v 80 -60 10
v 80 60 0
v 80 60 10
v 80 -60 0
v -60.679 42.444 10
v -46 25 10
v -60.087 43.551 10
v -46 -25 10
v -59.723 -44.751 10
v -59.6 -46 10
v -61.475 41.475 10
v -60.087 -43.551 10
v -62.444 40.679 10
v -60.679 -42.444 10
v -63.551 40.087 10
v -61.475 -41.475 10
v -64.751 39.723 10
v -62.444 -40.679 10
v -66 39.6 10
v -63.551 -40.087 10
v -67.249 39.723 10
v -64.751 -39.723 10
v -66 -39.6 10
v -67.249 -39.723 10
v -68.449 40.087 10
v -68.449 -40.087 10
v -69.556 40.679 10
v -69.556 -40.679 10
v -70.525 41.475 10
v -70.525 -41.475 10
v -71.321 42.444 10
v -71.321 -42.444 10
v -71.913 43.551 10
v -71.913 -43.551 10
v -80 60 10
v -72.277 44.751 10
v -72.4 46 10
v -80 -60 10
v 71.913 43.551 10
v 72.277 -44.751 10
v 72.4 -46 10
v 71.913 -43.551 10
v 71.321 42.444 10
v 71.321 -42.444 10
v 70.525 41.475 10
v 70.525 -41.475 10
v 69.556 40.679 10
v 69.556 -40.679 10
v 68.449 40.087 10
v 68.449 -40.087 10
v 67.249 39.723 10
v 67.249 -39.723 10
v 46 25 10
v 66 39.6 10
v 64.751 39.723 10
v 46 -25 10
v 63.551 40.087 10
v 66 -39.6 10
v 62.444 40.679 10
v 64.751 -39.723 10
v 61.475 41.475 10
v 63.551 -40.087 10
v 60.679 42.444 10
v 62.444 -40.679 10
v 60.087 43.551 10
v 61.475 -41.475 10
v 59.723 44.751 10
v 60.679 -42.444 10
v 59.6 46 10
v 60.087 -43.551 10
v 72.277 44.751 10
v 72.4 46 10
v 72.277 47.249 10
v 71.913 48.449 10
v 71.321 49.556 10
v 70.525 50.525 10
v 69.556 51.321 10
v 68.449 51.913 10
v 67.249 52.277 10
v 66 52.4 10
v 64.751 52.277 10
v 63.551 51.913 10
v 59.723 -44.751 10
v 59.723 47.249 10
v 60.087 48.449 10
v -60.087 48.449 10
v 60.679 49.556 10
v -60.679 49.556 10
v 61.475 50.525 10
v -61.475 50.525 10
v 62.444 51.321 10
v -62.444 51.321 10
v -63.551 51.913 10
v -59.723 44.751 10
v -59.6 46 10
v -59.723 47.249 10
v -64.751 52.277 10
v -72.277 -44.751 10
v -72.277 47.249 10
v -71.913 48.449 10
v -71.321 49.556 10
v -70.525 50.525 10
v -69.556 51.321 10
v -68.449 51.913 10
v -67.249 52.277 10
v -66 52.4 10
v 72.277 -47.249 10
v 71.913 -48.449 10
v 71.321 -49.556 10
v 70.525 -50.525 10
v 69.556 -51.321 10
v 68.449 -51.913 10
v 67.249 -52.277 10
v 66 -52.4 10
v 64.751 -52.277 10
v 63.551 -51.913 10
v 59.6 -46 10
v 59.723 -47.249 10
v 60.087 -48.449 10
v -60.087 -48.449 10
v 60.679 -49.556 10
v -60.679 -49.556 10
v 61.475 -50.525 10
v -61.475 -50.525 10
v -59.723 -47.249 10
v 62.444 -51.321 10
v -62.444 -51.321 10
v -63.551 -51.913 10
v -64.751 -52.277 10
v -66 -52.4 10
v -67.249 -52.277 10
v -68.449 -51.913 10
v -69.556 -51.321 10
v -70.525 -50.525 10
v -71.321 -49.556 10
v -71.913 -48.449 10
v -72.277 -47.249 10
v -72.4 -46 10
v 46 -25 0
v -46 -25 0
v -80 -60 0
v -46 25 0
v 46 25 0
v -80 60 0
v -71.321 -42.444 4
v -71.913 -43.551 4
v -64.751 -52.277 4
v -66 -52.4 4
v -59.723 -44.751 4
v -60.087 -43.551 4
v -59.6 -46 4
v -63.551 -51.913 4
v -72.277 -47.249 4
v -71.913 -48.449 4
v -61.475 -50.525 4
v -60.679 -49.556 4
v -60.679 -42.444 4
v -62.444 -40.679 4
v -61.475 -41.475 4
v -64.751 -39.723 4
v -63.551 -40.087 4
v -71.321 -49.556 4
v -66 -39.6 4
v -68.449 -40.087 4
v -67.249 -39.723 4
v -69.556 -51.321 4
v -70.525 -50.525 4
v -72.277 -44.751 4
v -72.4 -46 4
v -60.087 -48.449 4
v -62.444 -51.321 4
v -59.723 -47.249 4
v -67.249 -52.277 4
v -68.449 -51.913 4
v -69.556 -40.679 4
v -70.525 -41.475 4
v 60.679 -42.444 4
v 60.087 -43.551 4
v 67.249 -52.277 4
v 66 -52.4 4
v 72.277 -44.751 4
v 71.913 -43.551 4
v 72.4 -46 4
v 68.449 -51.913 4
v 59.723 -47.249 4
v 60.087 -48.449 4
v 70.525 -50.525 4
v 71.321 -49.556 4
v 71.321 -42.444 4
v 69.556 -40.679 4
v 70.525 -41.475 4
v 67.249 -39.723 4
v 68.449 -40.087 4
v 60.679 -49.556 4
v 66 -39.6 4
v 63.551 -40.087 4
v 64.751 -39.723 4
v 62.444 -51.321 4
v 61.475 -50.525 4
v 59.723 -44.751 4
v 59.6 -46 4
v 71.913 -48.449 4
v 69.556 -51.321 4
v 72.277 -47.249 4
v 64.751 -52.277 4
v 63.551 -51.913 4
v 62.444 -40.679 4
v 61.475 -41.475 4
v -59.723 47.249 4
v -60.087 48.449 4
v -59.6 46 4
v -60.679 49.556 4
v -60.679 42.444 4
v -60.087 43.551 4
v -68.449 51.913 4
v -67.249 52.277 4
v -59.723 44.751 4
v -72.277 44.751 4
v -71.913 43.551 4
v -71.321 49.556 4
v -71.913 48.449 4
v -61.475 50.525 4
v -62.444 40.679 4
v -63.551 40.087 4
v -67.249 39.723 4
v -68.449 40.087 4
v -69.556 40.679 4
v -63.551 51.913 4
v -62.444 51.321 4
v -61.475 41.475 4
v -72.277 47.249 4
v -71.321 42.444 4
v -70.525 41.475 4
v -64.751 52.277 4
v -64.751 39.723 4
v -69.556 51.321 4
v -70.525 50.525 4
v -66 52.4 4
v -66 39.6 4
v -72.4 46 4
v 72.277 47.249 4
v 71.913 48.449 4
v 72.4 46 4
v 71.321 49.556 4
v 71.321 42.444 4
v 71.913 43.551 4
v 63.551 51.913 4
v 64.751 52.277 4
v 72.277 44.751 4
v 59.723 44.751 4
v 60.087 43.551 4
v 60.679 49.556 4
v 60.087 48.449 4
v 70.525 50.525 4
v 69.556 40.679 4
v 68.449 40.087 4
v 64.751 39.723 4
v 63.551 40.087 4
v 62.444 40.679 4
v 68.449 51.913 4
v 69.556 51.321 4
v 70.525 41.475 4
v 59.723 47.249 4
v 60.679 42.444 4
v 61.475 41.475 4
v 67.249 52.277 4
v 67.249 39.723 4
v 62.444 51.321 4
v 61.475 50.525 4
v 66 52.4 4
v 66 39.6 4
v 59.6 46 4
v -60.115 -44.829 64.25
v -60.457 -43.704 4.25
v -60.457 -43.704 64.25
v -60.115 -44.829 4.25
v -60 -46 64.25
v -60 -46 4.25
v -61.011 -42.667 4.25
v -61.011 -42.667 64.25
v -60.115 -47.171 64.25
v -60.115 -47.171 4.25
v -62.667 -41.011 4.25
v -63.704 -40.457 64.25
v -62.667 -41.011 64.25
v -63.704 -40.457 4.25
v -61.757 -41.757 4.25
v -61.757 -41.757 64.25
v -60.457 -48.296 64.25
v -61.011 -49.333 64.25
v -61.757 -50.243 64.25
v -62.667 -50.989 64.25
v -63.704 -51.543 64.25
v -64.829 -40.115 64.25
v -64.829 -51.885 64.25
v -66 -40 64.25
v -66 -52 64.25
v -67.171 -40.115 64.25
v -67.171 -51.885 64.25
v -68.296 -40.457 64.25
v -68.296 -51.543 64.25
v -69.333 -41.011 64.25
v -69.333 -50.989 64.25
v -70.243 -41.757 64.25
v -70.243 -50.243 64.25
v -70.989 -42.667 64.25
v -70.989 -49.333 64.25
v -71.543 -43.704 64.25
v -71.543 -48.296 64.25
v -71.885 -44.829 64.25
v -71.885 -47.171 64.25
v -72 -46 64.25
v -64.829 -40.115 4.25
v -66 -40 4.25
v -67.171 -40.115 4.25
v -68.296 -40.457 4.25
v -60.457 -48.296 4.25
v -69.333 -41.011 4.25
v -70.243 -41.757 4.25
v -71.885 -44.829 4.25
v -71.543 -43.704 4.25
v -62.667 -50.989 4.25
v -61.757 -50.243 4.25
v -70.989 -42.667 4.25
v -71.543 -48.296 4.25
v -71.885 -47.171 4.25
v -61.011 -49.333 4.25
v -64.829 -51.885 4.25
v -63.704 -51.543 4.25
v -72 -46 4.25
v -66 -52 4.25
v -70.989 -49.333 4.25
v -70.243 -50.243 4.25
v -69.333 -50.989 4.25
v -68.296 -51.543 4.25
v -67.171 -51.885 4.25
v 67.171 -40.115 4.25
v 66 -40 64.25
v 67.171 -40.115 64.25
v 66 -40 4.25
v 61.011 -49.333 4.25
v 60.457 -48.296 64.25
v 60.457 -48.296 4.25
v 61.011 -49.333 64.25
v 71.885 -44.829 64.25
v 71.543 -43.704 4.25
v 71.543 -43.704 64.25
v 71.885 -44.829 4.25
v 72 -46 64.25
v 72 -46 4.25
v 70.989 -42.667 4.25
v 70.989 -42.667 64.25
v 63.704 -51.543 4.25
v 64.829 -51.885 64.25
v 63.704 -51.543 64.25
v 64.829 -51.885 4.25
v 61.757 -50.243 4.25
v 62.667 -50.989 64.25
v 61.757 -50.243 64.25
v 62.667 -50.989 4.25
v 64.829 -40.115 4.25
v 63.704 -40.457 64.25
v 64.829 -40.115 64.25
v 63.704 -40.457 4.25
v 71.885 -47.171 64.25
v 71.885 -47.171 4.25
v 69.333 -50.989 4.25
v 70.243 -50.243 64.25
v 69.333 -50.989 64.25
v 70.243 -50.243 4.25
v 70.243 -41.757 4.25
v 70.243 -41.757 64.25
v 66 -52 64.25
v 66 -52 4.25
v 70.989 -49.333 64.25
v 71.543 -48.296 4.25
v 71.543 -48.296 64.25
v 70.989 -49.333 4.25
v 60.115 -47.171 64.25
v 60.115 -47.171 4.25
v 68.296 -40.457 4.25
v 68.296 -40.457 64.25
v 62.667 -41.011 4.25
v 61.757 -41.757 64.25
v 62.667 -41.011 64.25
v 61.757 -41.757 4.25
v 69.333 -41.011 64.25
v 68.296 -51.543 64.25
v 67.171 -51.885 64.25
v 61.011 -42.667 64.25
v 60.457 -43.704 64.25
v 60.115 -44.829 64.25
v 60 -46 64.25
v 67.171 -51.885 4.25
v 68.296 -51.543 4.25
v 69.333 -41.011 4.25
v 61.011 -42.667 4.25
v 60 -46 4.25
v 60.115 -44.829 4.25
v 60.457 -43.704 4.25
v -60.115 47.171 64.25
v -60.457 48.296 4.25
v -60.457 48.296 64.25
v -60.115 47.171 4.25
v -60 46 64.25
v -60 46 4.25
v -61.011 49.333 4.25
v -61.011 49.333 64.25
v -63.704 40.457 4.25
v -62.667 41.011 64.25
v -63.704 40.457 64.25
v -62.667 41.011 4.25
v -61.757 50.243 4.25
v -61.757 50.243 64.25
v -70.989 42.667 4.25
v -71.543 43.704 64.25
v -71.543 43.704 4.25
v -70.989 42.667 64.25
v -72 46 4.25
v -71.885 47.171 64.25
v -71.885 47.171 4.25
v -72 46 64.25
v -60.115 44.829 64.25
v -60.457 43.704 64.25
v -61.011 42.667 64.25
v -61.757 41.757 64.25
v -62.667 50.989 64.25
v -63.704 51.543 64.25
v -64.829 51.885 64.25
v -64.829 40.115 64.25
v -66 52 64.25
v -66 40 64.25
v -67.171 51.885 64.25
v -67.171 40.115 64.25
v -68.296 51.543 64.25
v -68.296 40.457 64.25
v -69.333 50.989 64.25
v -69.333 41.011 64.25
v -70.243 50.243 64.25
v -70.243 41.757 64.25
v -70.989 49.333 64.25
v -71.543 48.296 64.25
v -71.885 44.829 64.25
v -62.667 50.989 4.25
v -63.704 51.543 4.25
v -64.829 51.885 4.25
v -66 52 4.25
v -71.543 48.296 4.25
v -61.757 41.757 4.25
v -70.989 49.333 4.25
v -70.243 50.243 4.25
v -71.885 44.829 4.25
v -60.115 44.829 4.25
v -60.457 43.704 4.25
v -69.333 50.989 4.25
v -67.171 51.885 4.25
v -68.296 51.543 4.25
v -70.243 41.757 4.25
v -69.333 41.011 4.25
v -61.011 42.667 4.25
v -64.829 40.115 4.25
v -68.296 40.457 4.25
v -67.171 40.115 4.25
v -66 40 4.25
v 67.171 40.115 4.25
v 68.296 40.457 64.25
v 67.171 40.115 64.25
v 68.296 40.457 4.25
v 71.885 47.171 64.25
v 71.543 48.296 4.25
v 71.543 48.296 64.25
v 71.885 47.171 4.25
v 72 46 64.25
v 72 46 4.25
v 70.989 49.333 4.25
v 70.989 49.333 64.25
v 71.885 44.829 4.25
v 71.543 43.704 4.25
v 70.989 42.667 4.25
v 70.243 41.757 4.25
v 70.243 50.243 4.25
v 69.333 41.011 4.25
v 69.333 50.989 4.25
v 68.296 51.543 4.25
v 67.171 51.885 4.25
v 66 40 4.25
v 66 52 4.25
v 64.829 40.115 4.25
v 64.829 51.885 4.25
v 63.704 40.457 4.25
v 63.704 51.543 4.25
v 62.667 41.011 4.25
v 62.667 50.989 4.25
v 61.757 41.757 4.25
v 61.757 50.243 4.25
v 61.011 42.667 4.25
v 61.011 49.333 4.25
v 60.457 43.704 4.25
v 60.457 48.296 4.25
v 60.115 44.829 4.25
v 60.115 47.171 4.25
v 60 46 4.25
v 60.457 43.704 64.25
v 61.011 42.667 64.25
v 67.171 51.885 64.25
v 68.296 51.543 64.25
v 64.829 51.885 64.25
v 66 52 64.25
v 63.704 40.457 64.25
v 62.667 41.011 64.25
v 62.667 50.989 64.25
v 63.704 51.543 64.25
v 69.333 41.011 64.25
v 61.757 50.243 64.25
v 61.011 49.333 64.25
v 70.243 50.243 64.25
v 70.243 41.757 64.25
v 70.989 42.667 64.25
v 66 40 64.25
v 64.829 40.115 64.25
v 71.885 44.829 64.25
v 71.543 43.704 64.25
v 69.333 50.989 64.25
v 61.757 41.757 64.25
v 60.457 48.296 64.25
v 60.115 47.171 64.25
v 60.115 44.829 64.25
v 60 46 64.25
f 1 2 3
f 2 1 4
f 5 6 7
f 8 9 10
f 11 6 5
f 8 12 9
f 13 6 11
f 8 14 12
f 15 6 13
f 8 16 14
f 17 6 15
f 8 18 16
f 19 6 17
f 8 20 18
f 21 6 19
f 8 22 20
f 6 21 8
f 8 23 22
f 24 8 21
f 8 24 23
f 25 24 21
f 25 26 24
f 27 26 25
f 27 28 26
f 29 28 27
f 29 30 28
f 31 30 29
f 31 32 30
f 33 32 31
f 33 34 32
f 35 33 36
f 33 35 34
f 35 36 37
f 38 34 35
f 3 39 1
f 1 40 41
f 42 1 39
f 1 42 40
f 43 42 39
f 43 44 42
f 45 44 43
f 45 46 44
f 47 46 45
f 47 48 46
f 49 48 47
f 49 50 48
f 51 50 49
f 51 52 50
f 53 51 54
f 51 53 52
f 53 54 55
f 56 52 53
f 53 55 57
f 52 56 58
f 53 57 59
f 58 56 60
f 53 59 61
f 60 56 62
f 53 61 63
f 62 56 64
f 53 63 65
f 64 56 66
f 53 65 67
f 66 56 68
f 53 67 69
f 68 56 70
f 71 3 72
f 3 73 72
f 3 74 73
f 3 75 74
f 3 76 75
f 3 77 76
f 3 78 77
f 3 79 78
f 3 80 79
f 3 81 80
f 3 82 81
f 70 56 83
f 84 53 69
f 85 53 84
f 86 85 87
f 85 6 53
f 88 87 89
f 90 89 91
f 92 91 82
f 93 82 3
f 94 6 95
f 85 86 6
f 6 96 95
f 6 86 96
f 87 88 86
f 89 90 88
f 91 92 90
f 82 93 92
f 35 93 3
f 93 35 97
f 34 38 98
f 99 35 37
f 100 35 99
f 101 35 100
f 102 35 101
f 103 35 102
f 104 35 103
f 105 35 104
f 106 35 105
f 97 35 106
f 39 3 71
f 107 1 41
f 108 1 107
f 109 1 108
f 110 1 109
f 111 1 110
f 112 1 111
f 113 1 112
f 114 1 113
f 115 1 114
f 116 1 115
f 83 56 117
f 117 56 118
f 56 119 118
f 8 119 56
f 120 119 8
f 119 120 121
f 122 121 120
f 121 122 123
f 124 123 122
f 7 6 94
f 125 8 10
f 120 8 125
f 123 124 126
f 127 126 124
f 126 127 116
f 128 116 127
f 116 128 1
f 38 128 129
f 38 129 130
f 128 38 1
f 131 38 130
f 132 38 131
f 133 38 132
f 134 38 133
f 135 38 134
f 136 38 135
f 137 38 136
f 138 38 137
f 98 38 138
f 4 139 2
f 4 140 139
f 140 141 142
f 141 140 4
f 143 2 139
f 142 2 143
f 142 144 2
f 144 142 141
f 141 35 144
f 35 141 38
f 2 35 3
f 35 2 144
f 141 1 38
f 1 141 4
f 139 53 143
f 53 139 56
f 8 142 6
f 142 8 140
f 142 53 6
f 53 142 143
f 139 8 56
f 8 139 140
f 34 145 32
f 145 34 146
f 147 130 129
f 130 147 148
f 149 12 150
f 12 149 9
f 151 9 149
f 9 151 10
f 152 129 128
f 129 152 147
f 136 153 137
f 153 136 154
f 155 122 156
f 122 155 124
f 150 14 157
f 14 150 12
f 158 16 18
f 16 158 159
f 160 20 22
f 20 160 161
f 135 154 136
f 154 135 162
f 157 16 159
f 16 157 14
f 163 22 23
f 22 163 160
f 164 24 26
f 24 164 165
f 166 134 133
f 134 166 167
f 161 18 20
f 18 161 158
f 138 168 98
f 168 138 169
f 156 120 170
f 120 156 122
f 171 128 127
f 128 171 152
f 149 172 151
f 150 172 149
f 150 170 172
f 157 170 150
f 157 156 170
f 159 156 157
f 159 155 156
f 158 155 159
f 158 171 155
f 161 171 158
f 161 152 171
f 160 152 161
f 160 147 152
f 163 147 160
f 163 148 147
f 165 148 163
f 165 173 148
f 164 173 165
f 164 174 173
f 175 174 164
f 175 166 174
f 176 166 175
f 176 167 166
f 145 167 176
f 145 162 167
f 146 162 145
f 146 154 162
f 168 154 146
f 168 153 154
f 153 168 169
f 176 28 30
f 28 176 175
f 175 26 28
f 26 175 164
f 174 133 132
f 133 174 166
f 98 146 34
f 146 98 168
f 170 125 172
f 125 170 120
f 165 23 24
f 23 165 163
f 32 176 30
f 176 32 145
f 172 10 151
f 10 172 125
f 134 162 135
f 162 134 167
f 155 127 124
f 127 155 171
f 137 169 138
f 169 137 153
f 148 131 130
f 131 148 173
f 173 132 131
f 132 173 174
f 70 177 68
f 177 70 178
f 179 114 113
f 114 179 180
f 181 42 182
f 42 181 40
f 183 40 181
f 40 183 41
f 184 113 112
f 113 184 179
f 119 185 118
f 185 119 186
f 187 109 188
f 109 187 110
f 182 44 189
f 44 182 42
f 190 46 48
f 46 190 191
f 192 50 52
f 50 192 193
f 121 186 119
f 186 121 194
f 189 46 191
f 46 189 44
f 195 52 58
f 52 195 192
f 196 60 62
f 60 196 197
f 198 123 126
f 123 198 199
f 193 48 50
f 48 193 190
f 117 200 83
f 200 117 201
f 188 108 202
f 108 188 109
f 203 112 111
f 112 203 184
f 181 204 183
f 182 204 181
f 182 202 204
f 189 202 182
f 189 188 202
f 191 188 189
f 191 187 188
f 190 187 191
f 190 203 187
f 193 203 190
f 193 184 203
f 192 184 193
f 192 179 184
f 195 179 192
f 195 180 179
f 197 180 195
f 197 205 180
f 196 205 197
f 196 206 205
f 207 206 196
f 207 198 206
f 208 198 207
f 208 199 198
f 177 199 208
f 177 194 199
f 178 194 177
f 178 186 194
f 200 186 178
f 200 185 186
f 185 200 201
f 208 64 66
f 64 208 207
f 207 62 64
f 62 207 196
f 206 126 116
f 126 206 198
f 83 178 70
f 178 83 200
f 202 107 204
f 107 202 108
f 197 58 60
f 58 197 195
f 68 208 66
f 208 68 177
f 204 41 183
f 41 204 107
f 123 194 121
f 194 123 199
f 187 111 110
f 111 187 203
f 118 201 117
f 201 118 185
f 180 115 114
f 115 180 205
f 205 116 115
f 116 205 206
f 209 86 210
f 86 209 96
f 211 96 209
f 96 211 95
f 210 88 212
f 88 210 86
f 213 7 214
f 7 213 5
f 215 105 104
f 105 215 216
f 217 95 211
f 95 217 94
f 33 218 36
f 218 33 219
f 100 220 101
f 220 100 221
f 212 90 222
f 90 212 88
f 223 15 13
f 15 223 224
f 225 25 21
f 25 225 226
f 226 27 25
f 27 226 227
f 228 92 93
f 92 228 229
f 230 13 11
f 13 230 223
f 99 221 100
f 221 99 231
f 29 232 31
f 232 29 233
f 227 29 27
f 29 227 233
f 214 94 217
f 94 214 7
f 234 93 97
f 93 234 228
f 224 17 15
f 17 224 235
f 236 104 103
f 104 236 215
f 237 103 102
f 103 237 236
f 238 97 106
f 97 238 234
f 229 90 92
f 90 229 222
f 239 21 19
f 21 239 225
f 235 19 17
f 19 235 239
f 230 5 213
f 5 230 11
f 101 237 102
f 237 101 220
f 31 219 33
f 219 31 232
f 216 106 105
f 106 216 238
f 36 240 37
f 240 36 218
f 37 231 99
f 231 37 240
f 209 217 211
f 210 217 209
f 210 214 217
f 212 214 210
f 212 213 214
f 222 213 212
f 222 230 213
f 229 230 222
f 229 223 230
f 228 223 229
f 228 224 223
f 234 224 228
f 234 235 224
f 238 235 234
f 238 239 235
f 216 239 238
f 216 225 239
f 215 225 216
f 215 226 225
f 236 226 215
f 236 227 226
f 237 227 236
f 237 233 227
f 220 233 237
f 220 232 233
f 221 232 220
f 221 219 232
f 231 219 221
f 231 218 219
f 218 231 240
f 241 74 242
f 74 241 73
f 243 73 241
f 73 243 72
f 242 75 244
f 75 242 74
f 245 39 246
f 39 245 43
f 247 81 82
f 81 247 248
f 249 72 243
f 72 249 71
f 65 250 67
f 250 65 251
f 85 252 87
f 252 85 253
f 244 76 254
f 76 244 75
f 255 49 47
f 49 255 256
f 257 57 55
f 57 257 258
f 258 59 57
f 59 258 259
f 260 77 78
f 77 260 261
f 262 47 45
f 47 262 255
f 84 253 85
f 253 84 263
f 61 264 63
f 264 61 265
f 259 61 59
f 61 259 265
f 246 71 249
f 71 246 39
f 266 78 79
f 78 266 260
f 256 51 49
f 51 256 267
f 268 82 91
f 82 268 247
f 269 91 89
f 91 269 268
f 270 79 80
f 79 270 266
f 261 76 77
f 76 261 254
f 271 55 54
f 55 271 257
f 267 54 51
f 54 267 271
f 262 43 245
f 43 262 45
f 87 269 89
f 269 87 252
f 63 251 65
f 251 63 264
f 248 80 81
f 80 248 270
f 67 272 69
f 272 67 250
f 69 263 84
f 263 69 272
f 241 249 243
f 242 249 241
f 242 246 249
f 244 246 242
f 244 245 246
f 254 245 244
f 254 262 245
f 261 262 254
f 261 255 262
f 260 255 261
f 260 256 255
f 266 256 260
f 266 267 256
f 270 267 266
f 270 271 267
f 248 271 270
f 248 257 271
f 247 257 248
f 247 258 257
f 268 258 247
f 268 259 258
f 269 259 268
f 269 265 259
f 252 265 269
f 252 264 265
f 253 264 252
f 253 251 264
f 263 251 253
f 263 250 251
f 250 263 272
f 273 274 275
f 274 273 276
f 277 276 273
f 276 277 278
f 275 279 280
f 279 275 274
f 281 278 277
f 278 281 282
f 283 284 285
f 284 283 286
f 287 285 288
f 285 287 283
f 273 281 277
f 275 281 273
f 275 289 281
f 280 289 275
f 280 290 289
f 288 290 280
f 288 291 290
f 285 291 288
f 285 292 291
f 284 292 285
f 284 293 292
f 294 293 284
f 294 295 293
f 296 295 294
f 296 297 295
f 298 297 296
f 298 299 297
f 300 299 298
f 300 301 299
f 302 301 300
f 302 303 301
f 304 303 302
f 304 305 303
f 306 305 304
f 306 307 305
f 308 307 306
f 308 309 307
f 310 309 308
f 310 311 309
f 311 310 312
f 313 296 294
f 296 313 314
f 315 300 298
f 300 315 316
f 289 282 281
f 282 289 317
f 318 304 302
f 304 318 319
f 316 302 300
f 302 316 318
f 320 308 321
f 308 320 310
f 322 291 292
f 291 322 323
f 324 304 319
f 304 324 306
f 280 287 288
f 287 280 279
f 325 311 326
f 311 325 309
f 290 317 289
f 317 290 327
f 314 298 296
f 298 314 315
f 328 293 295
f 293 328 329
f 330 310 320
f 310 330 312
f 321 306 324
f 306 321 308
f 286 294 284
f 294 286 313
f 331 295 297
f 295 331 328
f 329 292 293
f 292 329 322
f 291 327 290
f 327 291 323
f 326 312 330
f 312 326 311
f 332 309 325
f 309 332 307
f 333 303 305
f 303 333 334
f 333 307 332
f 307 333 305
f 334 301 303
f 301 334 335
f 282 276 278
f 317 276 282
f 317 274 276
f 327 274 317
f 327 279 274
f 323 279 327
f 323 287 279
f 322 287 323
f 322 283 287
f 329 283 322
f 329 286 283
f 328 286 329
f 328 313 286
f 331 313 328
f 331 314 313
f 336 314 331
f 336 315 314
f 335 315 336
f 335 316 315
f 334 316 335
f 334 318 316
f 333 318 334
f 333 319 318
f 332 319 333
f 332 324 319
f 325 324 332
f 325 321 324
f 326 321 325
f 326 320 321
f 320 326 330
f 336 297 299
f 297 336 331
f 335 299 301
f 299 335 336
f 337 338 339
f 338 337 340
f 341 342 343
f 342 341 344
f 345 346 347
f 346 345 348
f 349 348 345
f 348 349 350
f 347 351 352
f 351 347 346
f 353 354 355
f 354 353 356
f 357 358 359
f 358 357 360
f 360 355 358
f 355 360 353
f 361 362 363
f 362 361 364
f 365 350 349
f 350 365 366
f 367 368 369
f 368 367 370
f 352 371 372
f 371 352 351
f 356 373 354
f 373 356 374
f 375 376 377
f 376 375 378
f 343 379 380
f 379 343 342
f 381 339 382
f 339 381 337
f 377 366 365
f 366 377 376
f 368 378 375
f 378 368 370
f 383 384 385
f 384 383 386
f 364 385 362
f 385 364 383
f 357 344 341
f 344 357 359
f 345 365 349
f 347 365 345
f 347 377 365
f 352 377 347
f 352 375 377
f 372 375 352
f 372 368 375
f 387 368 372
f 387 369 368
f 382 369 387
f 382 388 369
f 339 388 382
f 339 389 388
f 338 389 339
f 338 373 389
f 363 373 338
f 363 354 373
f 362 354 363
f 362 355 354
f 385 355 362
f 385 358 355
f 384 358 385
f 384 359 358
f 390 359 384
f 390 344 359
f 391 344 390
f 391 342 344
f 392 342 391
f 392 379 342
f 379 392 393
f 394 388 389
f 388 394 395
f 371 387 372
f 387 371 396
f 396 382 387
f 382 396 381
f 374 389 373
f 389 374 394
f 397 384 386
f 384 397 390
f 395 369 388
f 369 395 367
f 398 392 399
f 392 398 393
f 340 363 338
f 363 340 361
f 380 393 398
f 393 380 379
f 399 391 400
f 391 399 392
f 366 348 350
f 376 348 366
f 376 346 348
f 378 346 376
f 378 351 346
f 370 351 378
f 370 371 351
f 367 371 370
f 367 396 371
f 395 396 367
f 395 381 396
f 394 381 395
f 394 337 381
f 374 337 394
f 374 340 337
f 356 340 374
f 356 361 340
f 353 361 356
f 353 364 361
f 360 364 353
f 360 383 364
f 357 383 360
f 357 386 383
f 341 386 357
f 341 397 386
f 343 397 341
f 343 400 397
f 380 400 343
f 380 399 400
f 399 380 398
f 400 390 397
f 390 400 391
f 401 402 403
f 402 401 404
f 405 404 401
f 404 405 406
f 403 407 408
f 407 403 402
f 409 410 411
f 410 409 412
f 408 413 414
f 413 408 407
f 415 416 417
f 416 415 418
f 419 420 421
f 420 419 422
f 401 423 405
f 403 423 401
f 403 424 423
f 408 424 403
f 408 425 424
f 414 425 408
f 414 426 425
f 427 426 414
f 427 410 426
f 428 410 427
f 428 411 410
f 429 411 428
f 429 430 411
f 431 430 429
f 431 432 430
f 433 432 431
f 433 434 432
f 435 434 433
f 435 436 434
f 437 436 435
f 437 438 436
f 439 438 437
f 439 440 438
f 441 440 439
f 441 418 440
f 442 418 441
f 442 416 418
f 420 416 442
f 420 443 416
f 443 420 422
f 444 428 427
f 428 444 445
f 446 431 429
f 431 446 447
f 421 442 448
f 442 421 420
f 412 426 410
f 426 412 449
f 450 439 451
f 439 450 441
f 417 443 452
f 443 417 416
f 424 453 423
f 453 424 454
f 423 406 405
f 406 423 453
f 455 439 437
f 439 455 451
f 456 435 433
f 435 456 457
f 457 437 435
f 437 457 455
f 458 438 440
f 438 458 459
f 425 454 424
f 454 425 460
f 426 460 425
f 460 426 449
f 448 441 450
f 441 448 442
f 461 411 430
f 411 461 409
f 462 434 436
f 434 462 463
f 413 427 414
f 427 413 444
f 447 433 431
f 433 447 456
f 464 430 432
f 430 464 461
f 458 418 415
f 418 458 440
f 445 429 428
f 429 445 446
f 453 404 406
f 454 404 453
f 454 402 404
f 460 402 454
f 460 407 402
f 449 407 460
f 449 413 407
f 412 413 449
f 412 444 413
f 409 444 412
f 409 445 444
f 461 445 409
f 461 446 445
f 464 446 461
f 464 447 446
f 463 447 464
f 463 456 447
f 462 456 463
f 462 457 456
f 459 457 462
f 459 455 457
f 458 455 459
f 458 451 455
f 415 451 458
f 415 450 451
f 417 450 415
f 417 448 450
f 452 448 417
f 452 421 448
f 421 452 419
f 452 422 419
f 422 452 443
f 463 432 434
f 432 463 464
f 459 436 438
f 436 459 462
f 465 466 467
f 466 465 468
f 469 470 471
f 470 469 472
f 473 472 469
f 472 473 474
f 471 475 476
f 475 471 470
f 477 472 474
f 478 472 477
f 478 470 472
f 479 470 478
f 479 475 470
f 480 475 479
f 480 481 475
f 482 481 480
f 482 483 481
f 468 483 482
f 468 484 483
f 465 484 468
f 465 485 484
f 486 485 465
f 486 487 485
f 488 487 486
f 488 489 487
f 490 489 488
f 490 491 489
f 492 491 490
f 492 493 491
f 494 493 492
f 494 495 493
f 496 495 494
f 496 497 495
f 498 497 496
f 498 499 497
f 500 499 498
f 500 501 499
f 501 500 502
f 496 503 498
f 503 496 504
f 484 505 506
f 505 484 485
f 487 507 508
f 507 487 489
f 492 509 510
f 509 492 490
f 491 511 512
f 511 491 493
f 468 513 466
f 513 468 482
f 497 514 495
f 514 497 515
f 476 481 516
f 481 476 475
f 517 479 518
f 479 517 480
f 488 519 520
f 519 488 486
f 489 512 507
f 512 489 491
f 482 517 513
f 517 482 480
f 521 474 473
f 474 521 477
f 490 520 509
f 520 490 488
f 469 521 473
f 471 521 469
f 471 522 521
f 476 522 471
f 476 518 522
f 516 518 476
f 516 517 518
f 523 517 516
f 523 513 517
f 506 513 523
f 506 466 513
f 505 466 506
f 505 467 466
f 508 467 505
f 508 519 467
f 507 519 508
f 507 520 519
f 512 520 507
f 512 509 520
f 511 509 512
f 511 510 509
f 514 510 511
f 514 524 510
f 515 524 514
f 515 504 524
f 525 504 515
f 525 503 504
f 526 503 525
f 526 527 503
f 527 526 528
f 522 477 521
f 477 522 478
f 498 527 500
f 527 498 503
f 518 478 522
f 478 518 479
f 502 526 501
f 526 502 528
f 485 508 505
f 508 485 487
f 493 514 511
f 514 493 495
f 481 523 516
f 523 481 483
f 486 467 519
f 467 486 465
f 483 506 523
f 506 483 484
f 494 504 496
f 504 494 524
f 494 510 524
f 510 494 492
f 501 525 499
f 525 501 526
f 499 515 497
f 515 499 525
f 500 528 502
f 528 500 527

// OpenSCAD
$fn = 32;

// ------------------------------------------------------------------------
// Frame with four posts: 160 x 120 mm frame, four d12 posts
// Every part is its own module, assembly() places them once.
// ------------------------------------------------------------------------

// --- part 1 ---
module base_frame() {
  difference() {
    translate([-80, -60, 0]) cube([160, 120, 10]);
    translate([-46, -25, -1]) cube([92, 50, 12]);
    translate([-66, -46, 4]) cylinder(h = 7, d = 12.8);
    translate([66, -46, 4]) cylinder(h = 7, d = 12.8);
    translate([-66, 46, 4]) cylinder(h = 7, d = 12.8);
    translate([66, 46, 4]) cylinder(h = 7, d = 12.8);
  }
}

// --- part 2 ---
module post1() {
  cylinder(h = 60, d = 12);
}

// --- part 3 ---
module post2() {
  cylinder(h = 60, d = 12);
}

// --- part 4 ---
module post3() {
  cylinder(h = 60, d = 12);
}

// --- part 5 ---
module post4() {
  cylinder(h = 60, d = 12);
}

// --- assembly ---
module assembly() {
  translate([0, 0, 0]) rotate([0, 0, 0]) base_frame();
  translate([-66, -46, 4.25]) rotate([0, 0, 0]) post1();
  translate([66, -46, 4.25]) rotate([0, 0, 0]) post2();
  translate([-66, 46, 4.25]) rotate([0, 0, 0]) post3();
  translate([66, 46, 4.25]) rotate([0, 0, 0]) post4();
}

assembly();
